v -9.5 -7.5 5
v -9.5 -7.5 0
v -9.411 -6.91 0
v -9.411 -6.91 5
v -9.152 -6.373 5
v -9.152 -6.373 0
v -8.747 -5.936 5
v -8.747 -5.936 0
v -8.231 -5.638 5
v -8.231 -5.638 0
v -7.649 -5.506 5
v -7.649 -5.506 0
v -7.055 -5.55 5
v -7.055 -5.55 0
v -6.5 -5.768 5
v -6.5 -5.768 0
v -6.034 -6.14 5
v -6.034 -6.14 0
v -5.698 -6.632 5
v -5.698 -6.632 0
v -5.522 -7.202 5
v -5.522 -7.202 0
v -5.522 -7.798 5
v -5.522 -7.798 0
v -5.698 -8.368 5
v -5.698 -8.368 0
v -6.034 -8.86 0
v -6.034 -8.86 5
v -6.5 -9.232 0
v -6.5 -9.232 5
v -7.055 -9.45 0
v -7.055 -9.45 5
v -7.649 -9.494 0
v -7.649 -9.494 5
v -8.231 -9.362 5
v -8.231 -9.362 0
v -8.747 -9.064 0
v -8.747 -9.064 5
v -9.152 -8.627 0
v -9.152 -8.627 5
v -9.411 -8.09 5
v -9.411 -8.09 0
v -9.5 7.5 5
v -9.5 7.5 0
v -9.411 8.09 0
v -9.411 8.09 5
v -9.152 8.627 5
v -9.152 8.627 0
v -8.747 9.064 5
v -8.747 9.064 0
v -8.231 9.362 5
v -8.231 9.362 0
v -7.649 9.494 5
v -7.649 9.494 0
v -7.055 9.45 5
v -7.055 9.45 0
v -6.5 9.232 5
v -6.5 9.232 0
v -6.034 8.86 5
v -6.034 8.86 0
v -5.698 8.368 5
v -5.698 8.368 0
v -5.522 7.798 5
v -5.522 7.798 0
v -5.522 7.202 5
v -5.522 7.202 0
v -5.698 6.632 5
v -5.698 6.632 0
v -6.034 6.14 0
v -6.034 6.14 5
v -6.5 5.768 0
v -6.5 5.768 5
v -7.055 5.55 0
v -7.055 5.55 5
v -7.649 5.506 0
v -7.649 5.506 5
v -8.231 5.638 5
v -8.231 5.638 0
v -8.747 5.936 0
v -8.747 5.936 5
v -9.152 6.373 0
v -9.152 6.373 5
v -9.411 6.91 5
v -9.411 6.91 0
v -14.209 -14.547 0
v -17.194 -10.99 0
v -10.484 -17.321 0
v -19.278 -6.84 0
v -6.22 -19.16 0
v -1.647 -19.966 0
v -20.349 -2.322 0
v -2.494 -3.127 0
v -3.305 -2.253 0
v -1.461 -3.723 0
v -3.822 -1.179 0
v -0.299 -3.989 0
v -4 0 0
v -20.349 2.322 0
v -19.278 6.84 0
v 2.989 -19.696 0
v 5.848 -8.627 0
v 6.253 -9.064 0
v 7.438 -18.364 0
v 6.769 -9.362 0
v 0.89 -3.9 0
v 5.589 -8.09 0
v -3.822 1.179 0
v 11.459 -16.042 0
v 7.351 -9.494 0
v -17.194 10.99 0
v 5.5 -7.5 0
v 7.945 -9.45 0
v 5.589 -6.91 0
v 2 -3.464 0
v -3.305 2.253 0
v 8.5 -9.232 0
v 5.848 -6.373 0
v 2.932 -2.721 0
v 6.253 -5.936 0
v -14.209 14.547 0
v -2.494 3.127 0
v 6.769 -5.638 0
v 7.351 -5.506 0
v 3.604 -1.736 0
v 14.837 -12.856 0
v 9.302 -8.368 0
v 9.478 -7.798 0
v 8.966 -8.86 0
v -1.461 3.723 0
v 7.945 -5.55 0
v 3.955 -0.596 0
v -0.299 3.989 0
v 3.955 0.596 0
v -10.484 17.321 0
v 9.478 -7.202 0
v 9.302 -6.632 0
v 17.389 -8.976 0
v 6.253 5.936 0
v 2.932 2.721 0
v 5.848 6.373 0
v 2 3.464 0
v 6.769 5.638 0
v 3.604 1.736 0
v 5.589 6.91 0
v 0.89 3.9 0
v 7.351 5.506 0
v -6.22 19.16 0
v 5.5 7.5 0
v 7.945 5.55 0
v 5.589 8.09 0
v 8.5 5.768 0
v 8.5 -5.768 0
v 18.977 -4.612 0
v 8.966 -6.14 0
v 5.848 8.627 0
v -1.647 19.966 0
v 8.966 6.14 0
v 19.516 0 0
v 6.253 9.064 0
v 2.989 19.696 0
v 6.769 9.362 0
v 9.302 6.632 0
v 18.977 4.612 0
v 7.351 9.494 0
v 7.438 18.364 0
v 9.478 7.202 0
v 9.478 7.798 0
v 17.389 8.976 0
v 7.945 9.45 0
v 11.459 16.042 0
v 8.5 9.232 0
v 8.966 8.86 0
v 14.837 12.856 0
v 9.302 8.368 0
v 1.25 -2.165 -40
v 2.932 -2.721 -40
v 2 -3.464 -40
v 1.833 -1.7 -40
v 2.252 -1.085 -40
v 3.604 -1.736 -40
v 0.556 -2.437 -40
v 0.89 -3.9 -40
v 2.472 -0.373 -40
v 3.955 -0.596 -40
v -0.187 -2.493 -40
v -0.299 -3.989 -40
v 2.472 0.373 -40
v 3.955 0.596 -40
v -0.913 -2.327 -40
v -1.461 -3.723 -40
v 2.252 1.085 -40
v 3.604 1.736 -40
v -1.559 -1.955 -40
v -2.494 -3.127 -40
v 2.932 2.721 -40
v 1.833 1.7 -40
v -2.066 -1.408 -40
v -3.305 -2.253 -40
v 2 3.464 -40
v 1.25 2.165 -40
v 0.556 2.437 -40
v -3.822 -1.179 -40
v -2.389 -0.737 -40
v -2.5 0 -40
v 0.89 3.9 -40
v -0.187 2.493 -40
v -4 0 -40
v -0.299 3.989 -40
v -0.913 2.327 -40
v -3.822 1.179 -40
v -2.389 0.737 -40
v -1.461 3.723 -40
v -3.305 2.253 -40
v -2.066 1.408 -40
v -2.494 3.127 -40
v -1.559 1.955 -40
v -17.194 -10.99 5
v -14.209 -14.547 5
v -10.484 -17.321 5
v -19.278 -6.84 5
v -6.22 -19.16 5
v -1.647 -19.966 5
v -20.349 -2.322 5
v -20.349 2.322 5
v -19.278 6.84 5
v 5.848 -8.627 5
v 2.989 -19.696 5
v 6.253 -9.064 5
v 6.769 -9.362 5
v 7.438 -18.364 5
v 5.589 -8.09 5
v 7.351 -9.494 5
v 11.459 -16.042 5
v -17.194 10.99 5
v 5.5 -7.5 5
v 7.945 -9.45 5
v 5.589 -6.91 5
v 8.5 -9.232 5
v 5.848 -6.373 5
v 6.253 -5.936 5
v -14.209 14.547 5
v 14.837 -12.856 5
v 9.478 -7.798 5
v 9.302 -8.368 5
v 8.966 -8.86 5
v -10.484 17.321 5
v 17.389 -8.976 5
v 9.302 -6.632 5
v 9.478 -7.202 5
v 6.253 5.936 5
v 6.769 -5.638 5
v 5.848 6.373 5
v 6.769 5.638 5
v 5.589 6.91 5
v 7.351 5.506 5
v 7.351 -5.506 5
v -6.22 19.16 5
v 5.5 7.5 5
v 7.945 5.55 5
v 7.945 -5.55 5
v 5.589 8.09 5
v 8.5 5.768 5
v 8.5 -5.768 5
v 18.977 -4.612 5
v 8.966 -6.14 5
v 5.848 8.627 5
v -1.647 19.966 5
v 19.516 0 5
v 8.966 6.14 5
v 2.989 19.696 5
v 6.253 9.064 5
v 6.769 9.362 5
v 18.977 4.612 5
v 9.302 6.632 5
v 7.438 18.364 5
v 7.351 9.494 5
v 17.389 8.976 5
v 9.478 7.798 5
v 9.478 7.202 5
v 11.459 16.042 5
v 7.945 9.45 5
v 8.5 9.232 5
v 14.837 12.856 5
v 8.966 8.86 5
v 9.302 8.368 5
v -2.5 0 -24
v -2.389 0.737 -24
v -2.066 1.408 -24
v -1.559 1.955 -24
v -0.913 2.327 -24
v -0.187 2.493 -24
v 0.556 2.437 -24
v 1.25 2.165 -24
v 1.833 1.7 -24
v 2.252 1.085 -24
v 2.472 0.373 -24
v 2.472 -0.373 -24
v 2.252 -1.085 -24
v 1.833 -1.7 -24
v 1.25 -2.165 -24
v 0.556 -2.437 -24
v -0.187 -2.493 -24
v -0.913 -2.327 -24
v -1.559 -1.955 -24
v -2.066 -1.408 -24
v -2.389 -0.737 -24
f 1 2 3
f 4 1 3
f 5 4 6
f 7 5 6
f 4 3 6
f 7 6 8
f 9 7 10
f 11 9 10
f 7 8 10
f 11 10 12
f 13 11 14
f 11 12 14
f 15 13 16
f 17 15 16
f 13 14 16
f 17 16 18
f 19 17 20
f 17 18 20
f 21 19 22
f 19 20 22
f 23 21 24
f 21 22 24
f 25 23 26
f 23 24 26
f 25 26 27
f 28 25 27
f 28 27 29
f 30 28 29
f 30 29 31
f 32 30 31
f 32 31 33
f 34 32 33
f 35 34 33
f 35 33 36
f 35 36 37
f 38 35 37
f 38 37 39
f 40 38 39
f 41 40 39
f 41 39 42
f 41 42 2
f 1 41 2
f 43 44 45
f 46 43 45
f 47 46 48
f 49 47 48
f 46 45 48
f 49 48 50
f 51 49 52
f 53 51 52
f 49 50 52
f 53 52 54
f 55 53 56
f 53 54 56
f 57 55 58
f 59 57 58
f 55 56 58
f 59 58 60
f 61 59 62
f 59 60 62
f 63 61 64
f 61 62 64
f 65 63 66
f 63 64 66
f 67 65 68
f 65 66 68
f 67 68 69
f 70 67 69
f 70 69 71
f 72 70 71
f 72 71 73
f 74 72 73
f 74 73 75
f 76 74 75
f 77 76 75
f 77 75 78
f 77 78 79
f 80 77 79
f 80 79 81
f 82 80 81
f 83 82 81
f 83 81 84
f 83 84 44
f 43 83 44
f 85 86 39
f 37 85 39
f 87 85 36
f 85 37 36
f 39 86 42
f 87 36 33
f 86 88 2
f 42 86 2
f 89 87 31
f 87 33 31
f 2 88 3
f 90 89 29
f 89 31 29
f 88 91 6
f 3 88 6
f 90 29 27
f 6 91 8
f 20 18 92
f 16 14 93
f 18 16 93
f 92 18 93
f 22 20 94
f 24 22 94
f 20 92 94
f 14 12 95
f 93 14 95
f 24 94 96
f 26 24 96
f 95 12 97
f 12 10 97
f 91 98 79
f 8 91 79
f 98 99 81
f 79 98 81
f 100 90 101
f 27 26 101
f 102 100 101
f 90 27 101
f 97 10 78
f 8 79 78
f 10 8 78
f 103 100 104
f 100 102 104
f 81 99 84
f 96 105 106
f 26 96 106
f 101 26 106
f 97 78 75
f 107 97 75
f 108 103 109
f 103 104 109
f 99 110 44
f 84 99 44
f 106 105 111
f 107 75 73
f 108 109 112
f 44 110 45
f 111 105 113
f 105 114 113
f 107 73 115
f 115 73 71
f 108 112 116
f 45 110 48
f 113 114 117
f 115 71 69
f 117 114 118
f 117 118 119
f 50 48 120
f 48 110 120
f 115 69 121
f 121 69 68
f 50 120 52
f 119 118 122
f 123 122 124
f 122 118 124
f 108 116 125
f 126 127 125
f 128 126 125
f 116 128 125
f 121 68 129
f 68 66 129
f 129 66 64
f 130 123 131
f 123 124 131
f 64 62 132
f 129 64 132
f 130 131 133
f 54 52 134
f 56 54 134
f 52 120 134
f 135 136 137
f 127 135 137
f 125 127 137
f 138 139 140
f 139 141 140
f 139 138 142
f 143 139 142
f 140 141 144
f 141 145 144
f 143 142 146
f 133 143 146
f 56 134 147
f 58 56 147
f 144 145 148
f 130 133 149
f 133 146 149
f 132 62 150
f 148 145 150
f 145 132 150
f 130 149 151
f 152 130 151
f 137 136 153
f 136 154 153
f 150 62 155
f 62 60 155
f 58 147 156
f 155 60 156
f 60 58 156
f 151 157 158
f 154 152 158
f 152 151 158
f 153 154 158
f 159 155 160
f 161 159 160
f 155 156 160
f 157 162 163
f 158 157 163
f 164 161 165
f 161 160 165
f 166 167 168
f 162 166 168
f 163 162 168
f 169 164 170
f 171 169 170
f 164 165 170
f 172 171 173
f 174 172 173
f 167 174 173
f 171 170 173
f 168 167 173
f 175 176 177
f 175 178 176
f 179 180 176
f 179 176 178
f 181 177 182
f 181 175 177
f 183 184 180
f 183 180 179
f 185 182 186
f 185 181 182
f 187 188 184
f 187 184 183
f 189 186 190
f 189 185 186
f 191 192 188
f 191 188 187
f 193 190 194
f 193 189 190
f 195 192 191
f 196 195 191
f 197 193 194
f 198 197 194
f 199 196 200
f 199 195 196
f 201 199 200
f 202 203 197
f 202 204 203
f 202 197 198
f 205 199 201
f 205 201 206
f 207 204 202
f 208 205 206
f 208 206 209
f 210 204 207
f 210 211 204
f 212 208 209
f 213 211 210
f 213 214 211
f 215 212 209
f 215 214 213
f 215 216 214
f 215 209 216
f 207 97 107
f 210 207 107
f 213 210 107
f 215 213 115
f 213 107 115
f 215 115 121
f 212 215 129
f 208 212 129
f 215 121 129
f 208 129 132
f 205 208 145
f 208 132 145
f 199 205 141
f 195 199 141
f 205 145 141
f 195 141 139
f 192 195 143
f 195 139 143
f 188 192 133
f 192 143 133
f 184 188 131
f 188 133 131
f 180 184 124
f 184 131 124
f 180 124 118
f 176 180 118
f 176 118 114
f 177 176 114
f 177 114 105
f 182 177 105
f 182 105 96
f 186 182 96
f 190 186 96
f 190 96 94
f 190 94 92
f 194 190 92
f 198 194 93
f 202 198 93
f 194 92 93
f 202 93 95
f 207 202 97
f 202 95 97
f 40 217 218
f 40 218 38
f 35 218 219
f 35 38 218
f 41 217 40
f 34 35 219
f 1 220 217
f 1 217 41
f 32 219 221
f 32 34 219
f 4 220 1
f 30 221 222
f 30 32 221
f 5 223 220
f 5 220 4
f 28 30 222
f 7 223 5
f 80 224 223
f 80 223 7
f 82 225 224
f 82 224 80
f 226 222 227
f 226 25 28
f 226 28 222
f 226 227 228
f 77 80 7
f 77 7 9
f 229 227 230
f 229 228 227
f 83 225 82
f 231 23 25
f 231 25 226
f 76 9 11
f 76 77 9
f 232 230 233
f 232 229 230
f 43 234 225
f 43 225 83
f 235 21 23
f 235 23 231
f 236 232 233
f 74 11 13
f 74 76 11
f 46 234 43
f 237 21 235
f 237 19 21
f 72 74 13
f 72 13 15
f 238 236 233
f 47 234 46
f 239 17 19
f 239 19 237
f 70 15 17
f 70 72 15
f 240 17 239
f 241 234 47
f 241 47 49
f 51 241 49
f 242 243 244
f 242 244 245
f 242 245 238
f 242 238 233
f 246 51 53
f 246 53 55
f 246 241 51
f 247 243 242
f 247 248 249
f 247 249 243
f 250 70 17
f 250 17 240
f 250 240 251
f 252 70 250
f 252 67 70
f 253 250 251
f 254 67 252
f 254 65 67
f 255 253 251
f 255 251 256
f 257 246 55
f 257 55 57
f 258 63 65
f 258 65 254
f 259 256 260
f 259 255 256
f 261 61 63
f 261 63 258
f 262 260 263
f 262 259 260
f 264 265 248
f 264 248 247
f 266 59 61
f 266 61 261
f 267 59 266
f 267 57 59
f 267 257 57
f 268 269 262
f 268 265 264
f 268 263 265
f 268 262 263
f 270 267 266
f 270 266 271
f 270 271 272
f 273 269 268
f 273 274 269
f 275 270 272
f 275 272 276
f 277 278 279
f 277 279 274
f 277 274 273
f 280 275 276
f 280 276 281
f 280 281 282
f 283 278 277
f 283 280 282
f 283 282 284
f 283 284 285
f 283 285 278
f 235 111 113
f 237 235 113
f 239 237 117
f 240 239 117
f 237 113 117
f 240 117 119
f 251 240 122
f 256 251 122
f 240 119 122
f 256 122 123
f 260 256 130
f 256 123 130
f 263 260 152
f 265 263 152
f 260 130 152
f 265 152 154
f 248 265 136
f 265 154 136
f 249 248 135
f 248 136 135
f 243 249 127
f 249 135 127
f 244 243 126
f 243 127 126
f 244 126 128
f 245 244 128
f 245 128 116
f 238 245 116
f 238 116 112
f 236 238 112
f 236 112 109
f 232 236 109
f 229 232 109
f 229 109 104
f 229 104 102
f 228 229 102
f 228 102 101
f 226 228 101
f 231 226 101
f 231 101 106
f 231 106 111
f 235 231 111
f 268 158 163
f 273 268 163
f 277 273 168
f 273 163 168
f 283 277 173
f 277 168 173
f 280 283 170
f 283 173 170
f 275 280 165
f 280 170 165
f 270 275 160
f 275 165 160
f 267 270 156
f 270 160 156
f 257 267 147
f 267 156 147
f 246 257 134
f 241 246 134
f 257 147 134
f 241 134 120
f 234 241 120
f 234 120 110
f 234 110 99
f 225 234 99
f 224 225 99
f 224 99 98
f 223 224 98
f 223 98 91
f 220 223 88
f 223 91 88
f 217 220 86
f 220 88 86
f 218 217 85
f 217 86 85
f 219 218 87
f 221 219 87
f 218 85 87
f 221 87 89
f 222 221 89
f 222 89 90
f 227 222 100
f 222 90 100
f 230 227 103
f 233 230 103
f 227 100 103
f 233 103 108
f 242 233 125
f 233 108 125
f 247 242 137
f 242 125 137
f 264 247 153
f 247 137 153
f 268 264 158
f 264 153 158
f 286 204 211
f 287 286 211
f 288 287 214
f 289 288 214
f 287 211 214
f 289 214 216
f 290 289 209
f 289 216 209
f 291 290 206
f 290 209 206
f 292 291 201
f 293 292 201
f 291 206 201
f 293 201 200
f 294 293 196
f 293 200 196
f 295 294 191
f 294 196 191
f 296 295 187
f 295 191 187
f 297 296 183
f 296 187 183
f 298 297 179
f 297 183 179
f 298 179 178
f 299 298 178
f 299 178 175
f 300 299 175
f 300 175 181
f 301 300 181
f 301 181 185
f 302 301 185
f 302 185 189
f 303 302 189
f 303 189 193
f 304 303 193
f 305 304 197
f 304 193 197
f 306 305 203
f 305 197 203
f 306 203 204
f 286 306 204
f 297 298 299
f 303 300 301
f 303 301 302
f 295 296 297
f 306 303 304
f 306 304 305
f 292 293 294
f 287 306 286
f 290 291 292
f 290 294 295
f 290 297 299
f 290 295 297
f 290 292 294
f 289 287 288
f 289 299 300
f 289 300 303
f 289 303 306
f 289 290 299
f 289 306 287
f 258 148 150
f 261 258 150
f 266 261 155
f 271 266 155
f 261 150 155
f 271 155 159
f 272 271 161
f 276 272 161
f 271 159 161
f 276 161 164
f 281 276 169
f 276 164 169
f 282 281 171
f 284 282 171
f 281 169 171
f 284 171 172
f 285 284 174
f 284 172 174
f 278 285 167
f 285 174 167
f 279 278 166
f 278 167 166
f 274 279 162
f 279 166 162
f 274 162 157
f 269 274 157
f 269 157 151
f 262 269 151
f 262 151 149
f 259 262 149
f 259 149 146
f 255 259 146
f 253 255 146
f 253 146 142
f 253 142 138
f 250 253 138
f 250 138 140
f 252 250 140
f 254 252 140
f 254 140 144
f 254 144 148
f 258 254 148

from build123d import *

# Parameters (mm, degrees)
SKETCH1_R           = 20
BOSS_EXTRUDE1_DEPTH = 5
SKETCH2_R           = 2
CUT_EXTRUDE1_DEPTH  = 30
SKETCH3_R           = 4
BOSS_EXTRUDE3_DEPTH = 40
SKETCH4_R           = 2.5
CUT_EXTRUDE2_DEPTH  = 16


with BuildPart() as part:
    # Sketch1 → Boss-Extrude1 (new body)
    with BuildSketch(Plane.XY):
        with Locations((-0.483808042, 0)):
            Circle(SKETCH1_R)
    extrude(amount=BOSS_EXTRUDE1_DEPTH)

    # Sketch2 → Cut-Extrude1 (cut)
    with BuildSketch(Plane(origin=(0, 0, 0), x_dir=(-1, 0, 0), z_dir=(0, 0, -1))):
        with Locations((7.5, 7.5)):
            Circle(SKETCH2_R)
        with Locations((7.5, -7.5)):
            Circle(SKETCH2_R)
        with Locations((-7.5, -7.5)):
            Circle(SKETCH2_R)
        with Locations((-7.5, 7.5)):
            Circle(SKETCH2_R)
    extrude(amount=-CUT_EXTRUDE1_DEPTH, mode=Mode.SUBTRACT)

    # Sketch3 → Boss-Extrude3 (add)
    with BuildSketch(Plane(origin=(0, 0, 0), x_dir=(-1, 0, 0), z_dir=(0, 0, -1))):
        Circle(SKETCH3_R)
    extrude(amount=BOSS_EXTRUDE3_DEPTH)

    # Sketch4 → Cut-Extrude2 (cut)
    with BuildSketch(Plane(origin=(0, 0, -40), x_dir=(-1, 0, 0), z_dir=(0, 0, -1))):
        Circle(SKETCH4_R)
    extrude(amount=-CUT_EXTRUDE2_DEPTH, mode=Mode.SUBTRACT)


solid = part.part
